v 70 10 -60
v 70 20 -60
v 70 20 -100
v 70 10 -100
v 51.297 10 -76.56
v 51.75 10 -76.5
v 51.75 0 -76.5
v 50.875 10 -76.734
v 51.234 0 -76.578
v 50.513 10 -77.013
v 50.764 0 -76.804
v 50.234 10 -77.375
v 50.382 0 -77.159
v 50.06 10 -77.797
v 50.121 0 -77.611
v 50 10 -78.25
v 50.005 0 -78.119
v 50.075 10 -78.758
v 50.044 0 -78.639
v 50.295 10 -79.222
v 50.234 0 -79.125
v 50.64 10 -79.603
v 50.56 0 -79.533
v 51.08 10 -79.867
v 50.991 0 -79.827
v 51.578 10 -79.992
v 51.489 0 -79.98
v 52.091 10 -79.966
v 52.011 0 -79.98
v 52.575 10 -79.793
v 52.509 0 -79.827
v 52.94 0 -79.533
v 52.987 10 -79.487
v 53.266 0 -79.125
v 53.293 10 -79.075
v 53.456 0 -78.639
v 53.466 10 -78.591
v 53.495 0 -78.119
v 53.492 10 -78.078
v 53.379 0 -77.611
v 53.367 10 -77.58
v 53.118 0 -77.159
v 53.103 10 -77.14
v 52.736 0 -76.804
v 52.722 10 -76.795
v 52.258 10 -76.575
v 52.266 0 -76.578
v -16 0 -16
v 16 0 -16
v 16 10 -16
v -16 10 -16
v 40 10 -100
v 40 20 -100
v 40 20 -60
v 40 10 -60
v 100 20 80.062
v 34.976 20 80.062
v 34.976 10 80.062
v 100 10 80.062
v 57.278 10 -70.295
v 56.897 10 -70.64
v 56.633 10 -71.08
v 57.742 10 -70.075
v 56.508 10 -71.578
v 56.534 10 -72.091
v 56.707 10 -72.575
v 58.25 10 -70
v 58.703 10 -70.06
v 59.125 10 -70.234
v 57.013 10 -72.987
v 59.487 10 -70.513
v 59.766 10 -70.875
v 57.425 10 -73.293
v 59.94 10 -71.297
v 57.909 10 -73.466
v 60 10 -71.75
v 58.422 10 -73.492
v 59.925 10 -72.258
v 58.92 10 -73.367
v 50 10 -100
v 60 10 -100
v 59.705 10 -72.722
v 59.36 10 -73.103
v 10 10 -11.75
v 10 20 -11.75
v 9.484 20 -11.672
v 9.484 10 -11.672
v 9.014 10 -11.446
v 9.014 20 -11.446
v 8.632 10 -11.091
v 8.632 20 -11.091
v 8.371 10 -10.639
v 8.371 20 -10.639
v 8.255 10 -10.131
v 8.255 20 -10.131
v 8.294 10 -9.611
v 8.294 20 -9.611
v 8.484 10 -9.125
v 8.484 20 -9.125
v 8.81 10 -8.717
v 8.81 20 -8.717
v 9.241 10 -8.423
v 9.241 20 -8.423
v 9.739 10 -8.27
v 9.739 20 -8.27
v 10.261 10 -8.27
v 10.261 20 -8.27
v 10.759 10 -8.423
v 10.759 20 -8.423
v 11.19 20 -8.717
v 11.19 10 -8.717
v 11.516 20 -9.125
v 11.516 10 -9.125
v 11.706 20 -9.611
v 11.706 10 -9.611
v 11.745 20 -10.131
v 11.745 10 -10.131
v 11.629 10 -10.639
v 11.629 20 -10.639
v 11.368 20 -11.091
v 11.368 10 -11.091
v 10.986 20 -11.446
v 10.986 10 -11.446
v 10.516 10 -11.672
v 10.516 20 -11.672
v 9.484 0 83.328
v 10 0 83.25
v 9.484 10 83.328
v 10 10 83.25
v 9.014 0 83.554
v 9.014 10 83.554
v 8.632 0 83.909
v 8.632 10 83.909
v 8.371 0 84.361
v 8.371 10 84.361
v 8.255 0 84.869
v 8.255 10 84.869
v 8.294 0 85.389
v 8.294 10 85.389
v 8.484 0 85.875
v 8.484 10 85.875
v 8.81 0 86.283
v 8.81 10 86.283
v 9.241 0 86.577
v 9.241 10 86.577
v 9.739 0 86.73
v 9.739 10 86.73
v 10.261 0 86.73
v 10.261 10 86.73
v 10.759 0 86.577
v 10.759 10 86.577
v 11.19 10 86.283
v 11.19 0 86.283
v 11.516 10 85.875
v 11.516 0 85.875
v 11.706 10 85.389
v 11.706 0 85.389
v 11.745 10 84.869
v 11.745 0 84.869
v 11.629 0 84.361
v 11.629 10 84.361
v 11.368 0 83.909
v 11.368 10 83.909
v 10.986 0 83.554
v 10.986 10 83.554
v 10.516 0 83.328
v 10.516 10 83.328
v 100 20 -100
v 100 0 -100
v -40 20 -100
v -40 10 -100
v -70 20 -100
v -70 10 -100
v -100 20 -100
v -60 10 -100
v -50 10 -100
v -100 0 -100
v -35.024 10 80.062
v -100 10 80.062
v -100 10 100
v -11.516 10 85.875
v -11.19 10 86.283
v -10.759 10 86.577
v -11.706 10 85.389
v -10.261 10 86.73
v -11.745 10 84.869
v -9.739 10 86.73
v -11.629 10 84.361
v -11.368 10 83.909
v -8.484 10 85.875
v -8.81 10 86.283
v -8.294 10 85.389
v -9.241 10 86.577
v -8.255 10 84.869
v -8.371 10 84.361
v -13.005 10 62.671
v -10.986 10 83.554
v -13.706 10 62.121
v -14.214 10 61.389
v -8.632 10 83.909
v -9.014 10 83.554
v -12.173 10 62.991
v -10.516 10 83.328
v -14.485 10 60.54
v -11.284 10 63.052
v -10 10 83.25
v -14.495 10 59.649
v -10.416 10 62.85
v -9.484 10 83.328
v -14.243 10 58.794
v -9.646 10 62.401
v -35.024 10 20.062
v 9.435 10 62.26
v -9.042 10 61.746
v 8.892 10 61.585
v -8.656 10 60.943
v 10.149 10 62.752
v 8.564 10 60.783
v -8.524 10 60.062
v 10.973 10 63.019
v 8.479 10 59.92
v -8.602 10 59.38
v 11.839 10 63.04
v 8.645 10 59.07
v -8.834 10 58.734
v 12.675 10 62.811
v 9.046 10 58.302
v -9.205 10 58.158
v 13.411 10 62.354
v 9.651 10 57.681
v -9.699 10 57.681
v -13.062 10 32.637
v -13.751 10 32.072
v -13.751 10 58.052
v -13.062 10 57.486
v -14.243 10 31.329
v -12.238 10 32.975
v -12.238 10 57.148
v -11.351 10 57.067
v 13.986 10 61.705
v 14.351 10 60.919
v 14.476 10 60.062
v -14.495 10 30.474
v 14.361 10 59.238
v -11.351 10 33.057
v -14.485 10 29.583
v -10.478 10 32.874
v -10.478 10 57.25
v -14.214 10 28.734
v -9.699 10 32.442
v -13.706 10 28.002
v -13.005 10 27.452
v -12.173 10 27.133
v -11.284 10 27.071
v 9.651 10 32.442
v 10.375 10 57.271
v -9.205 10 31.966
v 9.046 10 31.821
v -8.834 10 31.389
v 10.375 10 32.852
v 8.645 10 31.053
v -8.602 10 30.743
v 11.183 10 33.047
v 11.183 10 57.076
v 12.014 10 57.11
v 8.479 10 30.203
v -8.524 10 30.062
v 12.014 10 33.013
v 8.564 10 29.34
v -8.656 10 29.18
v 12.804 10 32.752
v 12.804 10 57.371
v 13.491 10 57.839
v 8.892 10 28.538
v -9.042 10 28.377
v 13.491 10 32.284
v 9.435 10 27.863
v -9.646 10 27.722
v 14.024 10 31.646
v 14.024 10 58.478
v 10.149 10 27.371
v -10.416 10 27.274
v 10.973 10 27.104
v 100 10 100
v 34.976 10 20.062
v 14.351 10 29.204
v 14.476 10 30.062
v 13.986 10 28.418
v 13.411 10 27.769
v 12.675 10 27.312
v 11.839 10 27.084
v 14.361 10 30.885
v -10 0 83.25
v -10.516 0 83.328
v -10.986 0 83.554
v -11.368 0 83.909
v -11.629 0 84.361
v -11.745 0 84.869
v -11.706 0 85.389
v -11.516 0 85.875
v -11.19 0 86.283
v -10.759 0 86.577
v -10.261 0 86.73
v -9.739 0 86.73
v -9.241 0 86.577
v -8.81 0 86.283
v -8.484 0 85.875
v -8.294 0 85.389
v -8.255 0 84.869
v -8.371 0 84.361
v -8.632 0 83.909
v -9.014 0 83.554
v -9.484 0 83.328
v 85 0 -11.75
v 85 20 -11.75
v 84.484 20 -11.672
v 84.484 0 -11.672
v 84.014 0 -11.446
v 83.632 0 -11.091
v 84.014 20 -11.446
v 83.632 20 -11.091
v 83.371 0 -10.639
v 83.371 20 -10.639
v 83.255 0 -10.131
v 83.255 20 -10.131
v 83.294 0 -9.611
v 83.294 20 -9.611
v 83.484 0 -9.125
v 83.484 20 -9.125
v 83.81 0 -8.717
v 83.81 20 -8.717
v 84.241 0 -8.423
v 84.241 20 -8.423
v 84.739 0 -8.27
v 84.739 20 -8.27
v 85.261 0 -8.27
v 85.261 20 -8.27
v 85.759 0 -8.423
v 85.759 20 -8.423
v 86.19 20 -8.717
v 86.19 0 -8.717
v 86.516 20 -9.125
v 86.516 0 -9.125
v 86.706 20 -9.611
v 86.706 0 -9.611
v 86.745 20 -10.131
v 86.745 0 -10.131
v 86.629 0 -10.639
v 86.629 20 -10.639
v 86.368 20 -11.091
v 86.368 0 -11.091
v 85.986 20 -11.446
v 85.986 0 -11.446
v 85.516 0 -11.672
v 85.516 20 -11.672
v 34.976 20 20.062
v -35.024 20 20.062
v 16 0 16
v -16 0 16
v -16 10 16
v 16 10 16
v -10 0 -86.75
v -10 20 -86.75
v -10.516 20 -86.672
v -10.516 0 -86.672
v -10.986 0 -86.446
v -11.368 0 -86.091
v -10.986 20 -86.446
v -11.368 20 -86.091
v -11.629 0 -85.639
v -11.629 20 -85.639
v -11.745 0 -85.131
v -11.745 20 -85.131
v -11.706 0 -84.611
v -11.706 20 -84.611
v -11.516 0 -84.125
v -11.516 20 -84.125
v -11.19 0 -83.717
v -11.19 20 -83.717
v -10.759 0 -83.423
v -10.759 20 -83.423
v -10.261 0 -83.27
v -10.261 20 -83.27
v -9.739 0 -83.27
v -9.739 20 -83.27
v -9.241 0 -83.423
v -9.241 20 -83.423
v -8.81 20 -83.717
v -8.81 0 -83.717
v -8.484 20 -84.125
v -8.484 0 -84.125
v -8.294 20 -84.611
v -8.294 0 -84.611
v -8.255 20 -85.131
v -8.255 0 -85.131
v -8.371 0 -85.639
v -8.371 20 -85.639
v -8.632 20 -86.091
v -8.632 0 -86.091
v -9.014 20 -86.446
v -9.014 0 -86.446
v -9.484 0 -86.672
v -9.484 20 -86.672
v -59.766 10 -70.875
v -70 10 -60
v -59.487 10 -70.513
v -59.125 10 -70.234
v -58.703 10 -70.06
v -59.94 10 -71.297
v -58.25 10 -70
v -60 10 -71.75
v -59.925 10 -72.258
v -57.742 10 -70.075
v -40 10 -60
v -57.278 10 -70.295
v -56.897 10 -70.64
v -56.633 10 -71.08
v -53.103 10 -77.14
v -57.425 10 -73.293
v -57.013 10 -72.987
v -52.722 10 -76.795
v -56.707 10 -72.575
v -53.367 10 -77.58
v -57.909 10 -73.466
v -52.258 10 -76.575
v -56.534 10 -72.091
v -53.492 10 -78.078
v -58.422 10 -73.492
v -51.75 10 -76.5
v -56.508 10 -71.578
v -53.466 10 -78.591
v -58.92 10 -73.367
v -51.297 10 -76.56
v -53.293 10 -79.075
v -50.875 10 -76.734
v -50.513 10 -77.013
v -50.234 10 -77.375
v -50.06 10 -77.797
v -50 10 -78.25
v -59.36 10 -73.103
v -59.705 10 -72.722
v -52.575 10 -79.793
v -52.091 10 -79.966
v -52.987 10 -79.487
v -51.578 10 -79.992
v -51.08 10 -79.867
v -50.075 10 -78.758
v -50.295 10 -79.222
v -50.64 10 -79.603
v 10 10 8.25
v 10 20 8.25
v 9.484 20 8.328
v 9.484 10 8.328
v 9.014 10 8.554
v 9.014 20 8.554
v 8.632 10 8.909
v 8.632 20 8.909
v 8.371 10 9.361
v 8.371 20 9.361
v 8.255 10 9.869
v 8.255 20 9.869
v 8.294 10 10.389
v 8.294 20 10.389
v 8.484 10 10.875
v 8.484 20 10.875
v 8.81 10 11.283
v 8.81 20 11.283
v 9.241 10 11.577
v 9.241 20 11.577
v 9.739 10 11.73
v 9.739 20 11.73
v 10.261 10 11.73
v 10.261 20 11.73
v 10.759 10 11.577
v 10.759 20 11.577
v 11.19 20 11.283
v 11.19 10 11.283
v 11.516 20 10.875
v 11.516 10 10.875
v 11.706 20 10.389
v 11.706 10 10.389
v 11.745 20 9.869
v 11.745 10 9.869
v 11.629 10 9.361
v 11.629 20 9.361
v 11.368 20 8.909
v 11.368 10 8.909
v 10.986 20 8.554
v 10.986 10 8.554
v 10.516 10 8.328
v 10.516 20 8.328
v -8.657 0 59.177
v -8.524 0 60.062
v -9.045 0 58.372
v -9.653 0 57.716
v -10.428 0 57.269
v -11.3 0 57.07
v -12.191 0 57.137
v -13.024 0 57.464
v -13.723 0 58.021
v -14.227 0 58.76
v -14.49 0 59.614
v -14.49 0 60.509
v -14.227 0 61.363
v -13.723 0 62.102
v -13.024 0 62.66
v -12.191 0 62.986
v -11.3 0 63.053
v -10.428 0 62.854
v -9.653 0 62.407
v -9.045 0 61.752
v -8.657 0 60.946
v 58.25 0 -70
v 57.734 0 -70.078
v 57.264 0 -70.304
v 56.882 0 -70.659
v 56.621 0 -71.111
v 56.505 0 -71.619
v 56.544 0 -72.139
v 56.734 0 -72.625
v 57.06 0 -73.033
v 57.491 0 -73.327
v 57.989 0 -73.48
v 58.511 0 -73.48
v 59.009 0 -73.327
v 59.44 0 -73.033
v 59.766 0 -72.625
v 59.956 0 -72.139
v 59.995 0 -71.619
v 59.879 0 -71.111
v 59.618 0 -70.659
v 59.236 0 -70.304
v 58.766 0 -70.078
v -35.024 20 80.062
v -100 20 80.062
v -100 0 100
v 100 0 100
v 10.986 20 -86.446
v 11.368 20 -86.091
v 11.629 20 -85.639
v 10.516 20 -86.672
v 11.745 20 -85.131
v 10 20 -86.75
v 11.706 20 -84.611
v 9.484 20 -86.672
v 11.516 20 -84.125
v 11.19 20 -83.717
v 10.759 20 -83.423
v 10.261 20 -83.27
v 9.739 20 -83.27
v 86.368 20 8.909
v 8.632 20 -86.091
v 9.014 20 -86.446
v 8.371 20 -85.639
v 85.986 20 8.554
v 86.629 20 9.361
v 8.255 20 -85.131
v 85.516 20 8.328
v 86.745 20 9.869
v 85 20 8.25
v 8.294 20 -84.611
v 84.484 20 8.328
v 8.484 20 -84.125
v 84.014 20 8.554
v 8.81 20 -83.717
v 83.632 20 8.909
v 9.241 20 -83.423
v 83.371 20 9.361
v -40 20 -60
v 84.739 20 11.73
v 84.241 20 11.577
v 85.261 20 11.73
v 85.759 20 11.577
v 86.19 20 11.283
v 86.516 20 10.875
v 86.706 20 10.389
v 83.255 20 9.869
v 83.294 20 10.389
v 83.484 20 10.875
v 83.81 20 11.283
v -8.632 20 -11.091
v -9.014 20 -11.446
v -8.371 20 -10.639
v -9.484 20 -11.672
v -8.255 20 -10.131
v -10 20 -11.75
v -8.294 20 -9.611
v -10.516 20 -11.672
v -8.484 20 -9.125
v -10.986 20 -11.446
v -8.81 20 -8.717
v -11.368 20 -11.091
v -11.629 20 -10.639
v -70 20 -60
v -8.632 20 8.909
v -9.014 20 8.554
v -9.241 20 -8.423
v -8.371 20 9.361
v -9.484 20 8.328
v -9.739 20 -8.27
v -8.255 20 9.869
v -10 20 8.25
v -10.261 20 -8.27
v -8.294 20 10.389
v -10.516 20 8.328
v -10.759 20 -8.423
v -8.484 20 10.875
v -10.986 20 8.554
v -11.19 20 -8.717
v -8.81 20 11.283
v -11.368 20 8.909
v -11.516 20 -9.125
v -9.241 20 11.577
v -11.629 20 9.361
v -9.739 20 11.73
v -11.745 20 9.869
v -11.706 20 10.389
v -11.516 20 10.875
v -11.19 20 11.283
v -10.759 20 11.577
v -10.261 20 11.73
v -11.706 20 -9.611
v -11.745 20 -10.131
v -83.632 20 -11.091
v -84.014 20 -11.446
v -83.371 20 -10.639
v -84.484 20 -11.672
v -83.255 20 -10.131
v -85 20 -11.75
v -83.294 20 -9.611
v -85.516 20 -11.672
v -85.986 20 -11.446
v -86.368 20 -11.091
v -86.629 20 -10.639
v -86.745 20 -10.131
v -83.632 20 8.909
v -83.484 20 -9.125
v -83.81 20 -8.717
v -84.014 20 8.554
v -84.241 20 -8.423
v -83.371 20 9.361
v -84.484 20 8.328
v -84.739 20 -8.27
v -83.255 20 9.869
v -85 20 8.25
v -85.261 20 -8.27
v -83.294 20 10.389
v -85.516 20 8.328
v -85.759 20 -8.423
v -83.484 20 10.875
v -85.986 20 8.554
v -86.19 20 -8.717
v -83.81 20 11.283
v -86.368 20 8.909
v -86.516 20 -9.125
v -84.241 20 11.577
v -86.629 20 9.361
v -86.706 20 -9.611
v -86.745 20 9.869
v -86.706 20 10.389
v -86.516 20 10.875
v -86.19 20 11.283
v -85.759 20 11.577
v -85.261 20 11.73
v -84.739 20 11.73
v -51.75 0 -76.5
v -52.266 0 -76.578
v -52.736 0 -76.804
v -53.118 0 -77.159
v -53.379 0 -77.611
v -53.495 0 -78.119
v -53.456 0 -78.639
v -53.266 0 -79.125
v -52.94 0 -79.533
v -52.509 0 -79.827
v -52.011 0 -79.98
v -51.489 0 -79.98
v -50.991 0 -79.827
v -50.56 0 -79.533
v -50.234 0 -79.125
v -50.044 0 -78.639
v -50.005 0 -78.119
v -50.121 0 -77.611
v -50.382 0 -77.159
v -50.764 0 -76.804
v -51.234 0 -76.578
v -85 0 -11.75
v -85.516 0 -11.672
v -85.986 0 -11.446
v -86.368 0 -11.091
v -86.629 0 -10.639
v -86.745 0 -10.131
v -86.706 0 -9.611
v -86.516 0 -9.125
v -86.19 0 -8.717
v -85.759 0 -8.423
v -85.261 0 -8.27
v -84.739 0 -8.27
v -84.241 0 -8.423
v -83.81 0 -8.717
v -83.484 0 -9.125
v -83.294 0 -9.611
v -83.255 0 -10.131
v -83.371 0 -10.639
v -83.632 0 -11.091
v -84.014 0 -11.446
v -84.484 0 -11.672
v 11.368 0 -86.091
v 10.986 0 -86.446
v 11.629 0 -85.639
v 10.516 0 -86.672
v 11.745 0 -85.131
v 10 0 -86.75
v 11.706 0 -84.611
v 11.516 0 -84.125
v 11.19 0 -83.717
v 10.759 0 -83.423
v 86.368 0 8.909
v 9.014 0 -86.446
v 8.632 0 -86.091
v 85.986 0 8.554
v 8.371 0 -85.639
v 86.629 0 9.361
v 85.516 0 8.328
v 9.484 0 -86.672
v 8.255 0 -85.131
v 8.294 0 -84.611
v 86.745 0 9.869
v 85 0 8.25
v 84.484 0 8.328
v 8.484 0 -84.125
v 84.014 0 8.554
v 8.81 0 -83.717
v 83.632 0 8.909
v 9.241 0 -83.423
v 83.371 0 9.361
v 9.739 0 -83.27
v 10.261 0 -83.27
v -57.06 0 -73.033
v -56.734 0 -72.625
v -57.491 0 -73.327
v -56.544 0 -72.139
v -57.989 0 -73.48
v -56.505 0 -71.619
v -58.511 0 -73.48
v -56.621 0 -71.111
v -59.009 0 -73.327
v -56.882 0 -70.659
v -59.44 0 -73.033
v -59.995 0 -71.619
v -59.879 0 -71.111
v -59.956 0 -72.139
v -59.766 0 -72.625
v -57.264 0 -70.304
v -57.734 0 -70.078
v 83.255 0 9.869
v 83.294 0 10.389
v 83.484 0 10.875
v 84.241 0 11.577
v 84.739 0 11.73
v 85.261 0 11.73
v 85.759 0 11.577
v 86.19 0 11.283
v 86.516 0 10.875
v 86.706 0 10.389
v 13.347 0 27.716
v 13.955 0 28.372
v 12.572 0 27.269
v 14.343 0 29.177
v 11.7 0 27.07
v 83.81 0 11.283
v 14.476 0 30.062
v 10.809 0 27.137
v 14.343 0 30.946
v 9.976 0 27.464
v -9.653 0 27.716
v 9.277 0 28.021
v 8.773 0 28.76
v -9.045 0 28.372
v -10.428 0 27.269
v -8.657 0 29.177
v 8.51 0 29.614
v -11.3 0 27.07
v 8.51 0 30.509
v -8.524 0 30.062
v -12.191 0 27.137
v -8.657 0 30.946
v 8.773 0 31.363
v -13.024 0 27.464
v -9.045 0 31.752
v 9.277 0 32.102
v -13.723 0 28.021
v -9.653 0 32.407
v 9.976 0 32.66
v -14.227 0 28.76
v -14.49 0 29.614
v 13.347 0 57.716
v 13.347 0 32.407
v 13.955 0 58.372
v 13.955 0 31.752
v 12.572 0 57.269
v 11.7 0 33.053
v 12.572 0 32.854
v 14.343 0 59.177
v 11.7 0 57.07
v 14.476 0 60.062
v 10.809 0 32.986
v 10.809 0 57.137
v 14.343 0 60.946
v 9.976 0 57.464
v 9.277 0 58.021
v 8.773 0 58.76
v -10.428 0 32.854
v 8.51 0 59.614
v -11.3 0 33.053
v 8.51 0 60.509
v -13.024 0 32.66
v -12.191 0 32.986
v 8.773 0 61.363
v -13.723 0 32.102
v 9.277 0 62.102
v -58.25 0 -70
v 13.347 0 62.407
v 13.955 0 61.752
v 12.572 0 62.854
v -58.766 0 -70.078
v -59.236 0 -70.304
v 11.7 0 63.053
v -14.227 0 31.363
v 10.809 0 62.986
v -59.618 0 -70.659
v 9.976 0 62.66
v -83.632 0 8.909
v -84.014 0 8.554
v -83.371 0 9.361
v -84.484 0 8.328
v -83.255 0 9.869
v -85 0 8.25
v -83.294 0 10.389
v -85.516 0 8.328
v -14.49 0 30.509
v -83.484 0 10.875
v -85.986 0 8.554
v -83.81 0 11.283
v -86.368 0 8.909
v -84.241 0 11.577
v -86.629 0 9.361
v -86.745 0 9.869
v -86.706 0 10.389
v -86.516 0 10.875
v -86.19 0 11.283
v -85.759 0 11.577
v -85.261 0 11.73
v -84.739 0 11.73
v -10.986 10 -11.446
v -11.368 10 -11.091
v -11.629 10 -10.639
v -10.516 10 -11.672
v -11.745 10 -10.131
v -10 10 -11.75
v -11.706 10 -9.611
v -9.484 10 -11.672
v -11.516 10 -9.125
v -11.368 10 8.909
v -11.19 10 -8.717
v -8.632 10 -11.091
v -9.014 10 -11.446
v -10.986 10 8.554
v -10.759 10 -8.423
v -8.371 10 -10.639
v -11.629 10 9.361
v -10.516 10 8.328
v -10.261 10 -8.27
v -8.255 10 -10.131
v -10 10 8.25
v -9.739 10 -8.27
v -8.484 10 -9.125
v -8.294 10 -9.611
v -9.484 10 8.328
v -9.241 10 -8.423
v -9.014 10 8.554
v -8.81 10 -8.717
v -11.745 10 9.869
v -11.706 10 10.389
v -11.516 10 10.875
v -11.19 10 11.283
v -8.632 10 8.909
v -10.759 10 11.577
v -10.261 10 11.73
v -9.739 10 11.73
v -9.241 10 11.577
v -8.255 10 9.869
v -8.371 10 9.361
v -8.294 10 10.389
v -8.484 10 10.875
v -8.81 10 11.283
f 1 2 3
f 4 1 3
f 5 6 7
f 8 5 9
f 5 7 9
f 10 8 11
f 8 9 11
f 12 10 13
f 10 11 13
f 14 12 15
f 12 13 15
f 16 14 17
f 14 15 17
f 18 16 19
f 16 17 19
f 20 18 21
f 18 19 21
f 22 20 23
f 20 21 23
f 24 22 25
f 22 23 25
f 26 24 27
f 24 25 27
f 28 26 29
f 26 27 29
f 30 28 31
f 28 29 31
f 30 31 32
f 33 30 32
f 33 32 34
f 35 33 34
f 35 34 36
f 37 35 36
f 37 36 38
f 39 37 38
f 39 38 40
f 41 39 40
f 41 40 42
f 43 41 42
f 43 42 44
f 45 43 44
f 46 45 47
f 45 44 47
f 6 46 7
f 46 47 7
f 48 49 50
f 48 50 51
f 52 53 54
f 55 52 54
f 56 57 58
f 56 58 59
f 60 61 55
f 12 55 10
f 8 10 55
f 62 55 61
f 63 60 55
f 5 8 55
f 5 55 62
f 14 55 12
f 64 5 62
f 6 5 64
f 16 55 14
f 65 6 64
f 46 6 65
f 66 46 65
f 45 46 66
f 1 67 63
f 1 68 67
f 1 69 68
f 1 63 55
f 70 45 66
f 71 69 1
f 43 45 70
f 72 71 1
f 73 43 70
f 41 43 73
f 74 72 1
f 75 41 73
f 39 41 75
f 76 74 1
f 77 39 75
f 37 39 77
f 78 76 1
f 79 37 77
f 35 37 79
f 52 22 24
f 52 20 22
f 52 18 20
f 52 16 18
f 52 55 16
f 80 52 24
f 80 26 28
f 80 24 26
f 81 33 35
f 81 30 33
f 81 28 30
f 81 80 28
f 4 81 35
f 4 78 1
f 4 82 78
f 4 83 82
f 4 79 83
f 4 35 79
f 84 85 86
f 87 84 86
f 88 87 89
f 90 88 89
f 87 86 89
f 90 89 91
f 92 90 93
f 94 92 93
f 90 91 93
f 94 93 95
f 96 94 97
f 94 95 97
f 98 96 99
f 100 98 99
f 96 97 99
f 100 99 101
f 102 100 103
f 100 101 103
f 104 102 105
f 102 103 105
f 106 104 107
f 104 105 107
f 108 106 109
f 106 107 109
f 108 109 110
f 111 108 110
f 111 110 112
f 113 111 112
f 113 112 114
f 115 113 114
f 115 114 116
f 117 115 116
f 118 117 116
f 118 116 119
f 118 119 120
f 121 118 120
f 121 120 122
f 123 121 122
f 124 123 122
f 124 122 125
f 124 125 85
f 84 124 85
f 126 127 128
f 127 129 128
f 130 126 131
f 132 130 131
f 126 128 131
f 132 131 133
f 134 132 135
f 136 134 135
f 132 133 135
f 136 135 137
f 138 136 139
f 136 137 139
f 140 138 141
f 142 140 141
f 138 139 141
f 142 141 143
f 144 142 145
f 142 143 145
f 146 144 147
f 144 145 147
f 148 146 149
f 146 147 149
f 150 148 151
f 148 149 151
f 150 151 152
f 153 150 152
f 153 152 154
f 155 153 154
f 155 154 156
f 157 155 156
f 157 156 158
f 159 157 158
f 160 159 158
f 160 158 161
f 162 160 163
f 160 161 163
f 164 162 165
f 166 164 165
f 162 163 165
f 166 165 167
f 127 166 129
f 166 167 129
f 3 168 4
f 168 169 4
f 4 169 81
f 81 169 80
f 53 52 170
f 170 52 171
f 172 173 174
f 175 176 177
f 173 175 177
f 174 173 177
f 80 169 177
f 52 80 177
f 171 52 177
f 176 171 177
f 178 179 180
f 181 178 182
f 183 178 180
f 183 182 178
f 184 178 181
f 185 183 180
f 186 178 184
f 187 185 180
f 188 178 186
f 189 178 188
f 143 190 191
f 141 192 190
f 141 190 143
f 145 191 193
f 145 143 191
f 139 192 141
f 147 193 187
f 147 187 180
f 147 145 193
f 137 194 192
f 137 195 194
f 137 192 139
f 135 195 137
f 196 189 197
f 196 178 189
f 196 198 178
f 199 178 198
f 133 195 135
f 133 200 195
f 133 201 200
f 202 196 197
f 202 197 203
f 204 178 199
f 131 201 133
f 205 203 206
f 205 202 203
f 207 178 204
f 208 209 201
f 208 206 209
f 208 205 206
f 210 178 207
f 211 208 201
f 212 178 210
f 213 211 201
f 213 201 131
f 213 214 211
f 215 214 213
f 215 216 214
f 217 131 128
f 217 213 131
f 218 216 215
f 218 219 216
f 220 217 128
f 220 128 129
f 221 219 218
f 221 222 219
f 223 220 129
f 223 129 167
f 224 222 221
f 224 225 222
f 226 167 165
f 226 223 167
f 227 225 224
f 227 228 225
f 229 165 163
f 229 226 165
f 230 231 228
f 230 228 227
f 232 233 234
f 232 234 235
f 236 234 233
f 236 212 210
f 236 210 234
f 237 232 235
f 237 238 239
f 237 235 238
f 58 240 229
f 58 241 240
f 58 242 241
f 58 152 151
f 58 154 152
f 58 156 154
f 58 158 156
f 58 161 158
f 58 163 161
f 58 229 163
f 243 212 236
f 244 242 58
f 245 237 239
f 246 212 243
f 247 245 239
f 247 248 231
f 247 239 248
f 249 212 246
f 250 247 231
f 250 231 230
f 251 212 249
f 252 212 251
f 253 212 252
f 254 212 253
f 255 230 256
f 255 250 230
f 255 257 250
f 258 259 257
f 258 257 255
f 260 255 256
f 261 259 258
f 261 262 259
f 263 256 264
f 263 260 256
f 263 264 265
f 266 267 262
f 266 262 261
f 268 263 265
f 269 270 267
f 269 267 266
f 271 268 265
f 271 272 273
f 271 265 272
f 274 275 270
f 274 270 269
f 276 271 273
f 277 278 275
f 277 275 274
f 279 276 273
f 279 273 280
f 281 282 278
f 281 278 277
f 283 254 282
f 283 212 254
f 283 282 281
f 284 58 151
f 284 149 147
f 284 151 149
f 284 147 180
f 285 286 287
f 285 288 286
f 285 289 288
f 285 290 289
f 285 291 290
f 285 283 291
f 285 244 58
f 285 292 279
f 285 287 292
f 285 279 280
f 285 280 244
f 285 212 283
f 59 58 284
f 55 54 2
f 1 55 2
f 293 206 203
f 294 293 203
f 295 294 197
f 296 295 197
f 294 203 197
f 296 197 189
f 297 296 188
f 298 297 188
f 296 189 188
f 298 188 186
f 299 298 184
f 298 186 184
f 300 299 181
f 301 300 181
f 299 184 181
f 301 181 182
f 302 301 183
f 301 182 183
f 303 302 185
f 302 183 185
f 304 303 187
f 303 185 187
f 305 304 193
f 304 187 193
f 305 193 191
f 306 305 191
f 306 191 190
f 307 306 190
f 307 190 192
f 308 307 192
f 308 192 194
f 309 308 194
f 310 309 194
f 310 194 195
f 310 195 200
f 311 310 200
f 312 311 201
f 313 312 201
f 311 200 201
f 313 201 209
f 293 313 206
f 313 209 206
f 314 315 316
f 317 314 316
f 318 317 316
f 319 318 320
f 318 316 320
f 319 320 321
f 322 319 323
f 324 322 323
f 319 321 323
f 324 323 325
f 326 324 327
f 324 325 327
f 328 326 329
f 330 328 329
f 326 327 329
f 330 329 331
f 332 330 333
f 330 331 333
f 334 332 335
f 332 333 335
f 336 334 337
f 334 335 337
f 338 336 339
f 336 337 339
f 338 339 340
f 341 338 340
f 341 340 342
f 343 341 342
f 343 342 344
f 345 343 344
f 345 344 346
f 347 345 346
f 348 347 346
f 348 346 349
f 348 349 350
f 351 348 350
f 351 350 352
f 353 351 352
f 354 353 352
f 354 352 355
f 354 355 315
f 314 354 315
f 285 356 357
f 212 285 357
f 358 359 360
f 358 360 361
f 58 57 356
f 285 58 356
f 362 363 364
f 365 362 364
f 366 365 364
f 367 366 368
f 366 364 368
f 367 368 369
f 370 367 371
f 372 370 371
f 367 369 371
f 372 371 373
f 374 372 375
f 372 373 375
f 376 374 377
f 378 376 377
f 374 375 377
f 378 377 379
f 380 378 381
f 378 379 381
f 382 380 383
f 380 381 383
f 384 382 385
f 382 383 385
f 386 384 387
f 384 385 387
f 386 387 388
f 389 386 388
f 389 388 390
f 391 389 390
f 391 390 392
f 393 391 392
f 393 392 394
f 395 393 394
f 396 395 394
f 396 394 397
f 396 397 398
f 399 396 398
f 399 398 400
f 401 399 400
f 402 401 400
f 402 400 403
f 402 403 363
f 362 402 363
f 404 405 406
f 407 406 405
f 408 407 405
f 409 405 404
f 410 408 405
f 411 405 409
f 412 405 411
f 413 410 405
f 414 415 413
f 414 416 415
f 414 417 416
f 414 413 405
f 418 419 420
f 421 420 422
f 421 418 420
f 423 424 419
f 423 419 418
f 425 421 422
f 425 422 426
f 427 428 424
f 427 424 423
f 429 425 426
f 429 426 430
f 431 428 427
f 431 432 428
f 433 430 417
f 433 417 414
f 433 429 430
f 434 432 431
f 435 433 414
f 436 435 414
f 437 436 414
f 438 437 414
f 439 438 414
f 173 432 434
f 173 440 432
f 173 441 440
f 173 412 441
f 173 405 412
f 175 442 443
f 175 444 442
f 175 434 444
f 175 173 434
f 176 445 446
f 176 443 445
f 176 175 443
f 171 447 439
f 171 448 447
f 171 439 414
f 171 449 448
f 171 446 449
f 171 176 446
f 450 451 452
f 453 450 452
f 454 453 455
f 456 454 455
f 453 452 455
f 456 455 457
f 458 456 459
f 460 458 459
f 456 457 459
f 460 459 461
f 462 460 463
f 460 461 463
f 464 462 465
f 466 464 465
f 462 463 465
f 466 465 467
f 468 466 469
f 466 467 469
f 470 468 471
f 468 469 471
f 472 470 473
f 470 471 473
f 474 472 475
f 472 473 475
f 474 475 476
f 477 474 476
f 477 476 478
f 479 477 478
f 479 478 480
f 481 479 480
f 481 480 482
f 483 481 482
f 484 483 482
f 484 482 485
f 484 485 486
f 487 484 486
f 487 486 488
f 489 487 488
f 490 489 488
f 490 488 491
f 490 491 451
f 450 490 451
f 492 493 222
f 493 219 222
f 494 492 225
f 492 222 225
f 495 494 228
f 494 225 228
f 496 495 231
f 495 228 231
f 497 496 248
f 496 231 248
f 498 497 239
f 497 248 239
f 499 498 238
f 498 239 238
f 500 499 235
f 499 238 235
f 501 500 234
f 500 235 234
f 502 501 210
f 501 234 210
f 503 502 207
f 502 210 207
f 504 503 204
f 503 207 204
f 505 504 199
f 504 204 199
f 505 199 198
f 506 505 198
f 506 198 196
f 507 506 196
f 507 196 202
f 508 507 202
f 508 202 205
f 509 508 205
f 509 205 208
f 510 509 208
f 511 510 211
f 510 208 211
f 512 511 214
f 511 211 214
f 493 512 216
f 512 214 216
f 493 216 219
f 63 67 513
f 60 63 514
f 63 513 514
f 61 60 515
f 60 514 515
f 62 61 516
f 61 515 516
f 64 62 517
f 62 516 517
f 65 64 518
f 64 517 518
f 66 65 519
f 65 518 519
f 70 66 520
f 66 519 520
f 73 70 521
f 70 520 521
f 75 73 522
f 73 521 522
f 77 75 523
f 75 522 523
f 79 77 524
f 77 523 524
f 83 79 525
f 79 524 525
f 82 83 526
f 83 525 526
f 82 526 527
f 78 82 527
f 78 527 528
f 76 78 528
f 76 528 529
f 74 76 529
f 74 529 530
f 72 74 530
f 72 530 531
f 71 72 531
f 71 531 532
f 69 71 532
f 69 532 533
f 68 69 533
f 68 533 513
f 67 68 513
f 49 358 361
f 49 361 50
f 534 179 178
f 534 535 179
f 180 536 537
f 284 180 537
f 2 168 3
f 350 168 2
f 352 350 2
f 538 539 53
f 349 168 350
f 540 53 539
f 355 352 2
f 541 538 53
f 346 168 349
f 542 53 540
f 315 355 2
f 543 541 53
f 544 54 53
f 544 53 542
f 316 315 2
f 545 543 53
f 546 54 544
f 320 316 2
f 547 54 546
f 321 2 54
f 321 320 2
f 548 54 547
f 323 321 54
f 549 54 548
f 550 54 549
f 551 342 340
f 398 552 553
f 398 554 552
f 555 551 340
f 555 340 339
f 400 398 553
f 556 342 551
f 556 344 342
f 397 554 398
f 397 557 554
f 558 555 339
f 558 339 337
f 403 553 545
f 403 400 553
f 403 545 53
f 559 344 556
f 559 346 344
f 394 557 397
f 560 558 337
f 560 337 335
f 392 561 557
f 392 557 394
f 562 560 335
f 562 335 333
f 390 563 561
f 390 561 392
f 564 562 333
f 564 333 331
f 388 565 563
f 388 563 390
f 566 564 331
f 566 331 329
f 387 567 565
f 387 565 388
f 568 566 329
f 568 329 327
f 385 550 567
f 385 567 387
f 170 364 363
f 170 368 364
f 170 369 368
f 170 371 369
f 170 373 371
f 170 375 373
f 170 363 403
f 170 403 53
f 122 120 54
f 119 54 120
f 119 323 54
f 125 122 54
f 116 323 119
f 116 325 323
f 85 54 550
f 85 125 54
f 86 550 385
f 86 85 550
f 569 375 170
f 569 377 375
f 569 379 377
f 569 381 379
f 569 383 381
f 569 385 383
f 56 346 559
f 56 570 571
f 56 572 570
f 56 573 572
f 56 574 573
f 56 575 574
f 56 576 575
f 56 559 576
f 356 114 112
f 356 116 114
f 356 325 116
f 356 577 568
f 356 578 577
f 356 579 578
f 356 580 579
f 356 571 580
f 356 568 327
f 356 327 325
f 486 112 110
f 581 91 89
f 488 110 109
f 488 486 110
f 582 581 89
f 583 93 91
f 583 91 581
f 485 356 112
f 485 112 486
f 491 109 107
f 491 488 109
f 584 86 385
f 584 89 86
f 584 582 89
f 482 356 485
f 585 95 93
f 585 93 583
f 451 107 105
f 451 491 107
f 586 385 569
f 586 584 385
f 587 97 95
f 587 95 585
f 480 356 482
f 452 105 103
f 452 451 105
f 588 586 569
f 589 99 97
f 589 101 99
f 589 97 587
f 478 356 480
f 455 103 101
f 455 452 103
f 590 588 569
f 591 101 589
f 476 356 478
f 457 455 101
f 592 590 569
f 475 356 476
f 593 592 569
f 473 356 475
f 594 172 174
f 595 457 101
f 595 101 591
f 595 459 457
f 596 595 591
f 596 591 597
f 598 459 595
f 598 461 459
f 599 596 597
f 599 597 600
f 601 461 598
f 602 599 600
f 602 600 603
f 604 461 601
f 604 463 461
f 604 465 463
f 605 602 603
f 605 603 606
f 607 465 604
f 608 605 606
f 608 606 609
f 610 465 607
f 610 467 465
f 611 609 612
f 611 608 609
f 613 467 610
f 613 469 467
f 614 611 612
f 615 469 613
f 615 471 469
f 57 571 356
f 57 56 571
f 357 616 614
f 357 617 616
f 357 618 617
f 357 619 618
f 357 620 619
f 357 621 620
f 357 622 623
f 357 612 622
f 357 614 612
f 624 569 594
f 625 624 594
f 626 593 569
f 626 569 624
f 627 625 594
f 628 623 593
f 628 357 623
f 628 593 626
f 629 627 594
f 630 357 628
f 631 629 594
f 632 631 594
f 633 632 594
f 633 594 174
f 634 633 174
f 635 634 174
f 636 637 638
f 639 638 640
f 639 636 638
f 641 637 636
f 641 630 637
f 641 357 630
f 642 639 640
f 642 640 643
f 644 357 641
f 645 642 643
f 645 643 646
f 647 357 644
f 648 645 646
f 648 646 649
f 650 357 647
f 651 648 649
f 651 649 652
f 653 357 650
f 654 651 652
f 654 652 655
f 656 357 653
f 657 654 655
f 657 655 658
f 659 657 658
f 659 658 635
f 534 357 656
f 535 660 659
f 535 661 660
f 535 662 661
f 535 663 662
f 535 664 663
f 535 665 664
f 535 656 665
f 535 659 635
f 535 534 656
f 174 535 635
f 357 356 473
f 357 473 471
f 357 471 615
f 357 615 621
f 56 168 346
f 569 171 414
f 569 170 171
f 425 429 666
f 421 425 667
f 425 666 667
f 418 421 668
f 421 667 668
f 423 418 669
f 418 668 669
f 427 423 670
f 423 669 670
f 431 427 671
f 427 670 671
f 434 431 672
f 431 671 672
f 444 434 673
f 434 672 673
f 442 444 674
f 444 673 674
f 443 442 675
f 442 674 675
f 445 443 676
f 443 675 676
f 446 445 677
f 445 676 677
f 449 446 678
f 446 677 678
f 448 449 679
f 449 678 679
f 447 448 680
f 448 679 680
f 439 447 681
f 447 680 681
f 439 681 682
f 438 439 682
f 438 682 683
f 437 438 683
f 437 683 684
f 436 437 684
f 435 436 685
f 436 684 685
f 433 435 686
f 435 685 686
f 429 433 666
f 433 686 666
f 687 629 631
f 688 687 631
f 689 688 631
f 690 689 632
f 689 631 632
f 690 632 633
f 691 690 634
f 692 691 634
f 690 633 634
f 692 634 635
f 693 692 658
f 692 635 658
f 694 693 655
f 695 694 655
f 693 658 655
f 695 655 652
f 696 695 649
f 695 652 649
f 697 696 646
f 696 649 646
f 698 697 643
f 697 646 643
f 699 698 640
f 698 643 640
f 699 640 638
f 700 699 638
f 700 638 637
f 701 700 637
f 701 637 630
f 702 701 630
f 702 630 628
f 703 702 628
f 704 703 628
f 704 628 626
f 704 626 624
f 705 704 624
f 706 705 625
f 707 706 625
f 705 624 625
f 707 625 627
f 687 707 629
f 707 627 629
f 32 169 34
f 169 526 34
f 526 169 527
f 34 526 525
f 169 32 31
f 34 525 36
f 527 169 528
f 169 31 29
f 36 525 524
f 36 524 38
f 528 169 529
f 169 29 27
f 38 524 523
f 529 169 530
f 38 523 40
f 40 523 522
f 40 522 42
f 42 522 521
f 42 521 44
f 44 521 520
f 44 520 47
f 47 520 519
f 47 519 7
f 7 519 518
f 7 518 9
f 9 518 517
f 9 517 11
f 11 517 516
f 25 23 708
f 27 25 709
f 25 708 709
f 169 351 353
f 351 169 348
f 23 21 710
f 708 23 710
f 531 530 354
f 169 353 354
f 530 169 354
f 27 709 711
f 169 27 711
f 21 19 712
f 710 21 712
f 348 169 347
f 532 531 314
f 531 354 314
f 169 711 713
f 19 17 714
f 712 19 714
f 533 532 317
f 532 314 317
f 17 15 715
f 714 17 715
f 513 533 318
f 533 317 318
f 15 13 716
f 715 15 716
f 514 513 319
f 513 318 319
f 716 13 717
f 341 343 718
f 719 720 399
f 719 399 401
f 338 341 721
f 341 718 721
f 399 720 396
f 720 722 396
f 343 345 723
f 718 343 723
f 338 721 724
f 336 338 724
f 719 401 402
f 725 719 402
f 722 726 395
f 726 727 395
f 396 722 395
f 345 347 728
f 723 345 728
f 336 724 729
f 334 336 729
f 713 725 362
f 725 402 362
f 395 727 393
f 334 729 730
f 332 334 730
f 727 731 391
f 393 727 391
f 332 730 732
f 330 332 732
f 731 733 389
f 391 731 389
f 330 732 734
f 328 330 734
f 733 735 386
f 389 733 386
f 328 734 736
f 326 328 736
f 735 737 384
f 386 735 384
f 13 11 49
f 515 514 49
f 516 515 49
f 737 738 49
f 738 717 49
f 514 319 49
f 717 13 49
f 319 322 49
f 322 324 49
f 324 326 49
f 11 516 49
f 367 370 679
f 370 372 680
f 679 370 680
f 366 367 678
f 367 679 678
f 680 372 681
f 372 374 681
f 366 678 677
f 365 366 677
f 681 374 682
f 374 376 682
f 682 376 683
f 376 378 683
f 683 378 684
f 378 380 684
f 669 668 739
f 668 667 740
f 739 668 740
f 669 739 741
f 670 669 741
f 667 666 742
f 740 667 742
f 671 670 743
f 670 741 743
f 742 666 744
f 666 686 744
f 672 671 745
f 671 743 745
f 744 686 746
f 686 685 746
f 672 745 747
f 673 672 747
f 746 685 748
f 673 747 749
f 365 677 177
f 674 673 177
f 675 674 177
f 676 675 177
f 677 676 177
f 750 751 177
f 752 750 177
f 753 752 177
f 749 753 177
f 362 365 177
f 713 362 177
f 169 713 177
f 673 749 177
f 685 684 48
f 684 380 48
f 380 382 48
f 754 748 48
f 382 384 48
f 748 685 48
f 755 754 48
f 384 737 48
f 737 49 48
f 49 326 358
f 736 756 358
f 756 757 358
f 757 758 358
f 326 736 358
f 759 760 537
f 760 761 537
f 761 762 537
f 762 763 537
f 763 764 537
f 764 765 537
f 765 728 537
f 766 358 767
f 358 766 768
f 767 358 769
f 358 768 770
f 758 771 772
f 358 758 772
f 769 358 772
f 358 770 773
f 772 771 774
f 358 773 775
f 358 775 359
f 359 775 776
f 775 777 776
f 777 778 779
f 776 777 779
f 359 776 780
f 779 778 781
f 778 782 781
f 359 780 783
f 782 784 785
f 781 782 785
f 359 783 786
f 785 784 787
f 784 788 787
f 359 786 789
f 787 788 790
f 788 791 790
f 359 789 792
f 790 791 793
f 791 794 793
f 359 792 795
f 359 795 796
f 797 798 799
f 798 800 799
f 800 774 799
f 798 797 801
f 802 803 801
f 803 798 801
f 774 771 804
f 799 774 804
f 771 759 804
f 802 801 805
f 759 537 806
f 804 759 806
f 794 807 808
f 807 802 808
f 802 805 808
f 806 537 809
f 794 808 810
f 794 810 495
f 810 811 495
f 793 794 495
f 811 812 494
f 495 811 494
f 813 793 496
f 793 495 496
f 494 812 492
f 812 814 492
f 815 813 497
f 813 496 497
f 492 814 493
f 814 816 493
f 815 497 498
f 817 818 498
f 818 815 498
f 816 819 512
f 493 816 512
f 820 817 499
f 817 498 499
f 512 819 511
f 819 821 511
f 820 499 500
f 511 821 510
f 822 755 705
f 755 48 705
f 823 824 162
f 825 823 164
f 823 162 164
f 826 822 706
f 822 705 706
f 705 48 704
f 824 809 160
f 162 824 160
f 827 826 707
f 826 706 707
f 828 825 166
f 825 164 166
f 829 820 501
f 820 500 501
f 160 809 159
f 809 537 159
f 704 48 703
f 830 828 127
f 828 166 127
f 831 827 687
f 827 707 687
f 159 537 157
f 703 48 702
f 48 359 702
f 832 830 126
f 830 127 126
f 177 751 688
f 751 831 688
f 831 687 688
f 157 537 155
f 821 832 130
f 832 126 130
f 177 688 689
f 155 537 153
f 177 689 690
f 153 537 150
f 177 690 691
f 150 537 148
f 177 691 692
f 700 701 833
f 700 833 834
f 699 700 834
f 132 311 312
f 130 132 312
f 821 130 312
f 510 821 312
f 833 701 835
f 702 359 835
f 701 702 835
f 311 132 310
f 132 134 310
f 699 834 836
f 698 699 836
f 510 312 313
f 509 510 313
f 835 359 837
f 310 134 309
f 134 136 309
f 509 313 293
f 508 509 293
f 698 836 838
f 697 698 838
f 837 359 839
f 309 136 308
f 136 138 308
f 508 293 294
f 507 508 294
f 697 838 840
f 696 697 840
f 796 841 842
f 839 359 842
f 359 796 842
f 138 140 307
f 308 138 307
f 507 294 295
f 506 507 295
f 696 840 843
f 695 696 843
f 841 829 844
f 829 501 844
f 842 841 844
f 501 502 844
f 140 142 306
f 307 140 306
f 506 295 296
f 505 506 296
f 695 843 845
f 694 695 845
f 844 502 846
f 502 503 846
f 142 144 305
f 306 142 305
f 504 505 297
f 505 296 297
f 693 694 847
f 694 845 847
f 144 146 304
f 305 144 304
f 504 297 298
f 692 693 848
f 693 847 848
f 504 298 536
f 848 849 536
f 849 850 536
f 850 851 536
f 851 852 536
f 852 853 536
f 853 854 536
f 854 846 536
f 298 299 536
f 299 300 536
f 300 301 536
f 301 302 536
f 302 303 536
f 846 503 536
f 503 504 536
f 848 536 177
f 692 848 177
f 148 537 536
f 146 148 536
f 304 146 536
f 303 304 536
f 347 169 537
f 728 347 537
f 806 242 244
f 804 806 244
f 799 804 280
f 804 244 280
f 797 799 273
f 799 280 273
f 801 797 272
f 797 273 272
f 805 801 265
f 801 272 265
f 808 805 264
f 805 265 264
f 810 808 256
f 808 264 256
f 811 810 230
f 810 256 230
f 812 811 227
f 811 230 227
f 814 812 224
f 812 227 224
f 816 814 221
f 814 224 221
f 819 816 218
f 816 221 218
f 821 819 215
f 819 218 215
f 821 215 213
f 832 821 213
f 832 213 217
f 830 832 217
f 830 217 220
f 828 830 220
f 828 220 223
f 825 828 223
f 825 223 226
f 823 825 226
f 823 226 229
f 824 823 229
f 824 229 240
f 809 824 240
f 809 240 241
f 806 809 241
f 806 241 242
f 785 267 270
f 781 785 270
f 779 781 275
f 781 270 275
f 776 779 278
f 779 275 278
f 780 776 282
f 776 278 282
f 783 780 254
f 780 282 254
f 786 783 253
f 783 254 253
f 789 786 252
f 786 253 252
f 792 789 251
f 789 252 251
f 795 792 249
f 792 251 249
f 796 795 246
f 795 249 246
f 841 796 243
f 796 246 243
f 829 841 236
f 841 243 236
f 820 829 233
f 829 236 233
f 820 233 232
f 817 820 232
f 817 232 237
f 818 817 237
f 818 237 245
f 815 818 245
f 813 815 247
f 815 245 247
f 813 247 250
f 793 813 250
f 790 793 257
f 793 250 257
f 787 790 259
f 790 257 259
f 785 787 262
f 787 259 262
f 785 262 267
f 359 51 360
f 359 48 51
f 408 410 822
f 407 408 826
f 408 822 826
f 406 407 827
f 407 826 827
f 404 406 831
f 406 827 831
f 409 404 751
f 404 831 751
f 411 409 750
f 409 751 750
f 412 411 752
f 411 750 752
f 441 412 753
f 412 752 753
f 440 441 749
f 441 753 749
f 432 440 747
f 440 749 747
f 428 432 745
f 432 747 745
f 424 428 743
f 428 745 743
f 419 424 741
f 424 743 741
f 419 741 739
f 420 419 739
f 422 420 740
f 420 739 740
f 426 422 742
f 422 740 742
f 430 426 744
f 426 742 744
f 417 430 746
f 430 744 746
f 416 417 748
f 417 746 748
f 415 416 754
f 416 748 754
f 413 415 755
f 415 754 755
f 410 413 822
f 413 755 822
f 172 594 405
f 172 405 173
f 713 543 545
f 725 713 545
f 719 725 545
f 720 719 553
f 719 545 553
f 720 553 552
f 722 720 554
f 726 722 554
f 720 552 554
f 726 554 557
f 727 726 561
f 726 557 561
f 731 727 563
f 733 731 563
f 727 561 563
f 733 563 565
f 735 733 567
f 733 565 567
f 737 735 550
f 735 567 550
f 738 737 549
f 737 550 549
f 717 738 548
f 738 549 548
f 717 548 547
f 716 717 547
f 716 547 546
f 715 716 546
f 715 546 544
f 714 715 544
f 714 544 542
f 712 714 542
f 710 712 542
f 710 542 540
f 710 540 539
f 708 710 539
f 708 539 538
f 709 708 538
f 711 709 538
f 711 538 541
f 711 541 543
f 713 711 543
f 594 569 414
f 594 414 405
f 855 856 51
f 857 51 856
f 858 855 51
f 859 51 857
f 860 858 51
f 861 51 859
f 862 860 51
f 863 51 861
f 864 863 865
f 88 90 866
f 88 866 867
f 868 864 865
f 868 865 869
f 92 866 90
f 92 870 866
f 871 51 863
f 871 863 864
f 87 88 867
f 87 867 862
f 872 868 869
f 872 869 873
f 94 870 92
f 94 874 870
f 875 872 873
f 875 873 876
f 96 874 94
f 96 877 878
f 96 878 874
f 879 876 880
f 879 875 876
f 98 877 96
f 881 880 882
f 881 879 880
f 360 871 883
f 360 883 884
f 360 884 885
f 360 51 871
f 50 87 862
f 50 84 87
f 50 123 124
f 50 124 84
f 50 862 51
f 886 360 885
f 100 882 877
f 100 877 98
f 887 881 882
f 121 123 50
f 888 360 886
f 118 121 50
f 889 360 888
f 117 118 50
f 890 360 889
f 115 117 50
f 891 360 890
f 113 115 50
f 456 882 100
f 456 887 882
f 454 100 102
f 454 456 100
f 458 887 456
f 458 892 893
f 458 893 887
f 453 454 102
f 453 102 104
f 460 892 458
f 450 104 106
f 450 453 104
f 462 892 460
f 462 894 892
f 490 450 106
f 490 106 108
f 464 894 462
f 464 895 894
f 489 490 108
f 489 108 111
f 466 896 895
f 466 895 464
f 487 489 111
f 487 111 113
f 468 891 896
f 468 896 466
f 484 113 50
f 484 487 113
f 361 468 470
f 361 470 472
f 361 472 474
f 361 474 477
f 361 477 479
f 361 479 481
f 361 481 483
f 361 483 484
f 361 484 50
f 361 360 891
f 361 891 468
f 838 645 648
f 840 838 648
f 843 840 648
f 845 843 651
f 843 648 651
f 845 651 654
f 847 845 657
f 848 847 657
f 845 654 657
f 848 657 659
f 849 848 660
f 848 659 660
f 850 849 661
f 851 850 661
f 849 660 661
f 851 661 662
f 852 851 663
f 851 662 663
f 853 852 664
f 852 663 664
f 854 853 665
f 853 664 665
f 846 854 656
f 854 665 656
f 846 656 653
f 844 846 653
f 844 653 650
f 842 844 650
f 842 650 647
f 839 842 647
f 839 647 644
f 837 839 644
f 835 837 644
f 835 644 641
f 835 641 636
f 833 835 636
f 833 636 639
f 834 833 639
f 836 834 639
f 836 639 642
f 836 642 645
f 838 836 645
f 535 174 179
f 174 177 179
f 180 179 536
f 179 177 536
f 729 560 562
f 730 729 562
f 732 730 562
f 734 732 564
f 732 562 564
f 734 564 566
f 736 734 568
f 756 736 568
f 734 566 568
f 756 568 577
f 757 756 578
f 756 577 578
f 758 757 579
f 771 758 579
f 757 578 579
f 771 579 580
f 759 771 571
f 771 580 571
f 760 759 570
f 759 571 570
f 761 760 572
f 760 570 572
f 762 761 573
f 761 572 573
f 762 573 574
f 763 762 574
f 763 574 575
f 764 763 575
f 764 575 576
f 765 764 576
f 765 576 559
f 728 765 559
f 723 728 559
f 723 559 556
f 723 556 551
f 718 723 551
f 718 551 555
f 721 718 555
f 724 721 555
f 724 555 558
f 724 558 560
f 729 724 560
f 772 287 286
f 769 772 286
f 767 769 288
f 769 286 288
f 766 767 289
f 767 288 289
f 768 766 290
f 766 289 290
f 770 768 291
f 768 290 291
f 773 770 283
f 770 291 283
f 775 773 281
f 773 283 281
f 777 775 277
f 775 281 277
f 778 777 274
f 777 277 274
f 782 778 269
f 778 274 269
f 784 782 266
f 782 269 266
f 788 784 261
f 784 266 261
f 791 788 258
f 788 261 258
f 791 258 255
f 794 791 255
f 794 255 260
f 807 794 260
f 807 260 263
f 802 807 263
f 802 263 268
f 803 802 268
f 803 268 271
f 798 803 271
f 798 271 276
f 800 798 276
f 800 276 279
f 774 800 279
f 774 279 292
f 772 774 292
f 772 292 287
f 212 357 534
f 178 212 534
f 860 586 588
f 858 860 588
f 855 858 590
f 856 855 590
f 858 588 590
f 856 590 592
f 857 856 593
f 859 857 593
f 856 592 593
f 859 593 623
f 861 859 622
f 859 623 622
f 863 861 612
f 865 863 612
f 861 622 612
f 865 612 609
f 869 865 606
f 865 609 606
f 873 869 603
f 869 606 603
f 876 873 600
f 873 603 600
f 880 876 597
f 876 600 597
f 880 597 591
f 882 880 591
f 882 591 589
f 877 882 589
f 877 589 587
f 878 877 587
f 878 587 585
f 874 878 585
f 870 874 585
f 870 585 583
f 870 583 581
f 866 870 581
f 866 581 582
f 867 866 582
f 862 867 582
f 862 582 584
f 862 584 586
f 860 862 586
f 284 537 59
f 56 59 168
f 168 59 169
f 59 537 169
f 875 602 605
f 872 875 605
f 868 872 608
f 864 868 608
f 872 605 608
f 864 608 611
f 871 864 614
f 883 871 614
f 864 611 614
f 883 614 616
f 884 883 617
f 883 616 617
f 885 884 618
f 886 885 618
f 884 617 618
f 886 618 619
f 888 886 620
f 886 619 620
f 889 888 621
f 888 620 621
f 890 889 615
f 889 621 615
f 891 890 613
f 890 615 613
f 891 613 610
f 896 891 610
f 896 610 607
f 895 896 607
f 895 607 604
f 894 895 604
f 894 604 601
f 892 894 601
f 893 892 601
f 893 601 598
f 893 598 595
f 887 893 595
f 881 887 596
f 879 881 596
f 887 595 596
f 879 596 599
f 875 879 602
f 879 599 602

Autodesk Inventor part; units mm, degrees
ref_plane "YZ Plane" through (0, 0, 0) normal (1, 0, 0) x (0, 1, 0)
ref_plane "XZ Plane" through (0, 0, 0) normal (0, 1, 0) x (-1, 0, 0)
ref_plane "XY Plane" through (0, 0, 0) normal (0, 0, 1) x (1, 0, 0)
sketch "Boceto1" plane through (0, 0, 0) normal (0, 1, 0) x (-1, 0, 0)
  line L0 (100, 100) -> (-100, 100)
  line L1 (-100, 100) -> (-100, -100)
  line L2 (-100, -100) -> (100, -100)
  line L3 (100, -100) -> (100, 100)
  line L4 (100, 100) -> (-100, -100) construction
  line L5 (-100, 100) -> (100, -100) construction
  point P0 (0, 0)
  dimension "d0" = 200
  dimension "d1" = 200
extrude "Extrusión1" add sketch "Boceto1" along normal blind 20
sketch "Boceto2" plane through (0, 20, 0) normal (0, 1, 0) x (1, 0, 0)
  circle A0 centre (-11.5239, -30.0616) radius 3
  circle A1 centre (11.4761, -30.0616) radius 3
  circle A2 centre (-11.5239, -60.0616) radius 3
  circle A3 centre (11.4761, -60.0616) radius 3
  line L0 (-0.0239, -45.0616) -> (-35.0239, -45.0616)
  line L1 (-35.0239, -45.0616) -> (-35.0239, -80.0616)
  line L2 (-0.0239, -45.0616) -> (34.9761, -45.0616)
  line L3 (-11.5239, -30.0616) -> (11.4761, -60.0616)
  line L4 (-11.5239, -60.0616) -> (11.4761, -30.0616)
  line L5 (34.9761, -20.0616) -> (-35.0239, -20.0616)
  line L6 (-35.0239, -20.0616) -> (-35.0239, -80.0616)
  line L7 (34.9761, -80.0616) -> (34.9761, -20.0616)
  line L8 (-105, -100.0616) -> (105, -100.0616)
  line L9 (-105.0239, -80.0616) -> (104.9761, -80.0616)
  line L10 (-35.0239, -80.0616) -> (34.9761, -80.0616)
  line L11 (105, -100.0616) -> (95.8154, -100.0616)
  line L12 (-105.0239, -80.0616) -> (104.9761, -80.0616)
  line L13 (105, -80.0616) -> (-105, -80.0616)
  line L14 (-105, -100.0616) -> (105, -100.0616)
  line L15 (105, -90.0616) -> (94.0798, -90.0616)
  line L16 (-105, -100.0616) -> (105, -100.0616)
  line L17 (-105, -80.0616) -> (105, -80.0616)
  line L18 (105, -80.0616) -> (105, -100.0616)
  line L19 (105, -100.0616) -> (-105, -100.0616)
  line L20 (-105, -100.0616) -> (-105, -80.0616)
  line L21 (-100, 100) -> (-100, -100) projected
  line L22 (-100, -100) -> (100.4077, -100)
  point P0 (0, 0)
  point P1 (0, -10.0616)
  point P2 (0, -90.0616)
  point P3 (-0.0478, -80.0616)
  dimension "d4" = 20
  dimension "d5" = 20
  dimension "d6" = 30
  dimension "d7" = 30
  dimension "d8" = 20
  dimension "d9" = 35
  dimension "d10" = 35
  dimension "d11" = 60
extrude "Extrusión2" cut sketch "Boceto2" against normal blind 10
sketch "Boceto3" plane through (0, 20, 0) normal (0, 1, 0) x (1, 0, 0)
  circle A0 centre (-11.5239, -30.0616) radius 3 projected
  circle A1 centre (-11.5239, -30.0616) radius 3
  circle A2 centre (11.4761, -30.0616) radius 3 projected
  circle A3 centre (11.4761, -30.0616) radius 3
  circle A4 centre (11.4761, -60.0616) radius 3 projected
  circle A5 centre (11.4761, -60.0616) radius 3
  circle A6 centre (-11.5239, -60.0616) radius 3
  point P0 (0, 0)
extrude "Extrusión3" cut sketch "Boceto3" against normal blind 20
sketch "Boceto4" plane through (0, 20, 0) normal (0, 1, 0) x (1, 0, 0)
  circle A0 centre (-51.75, 78.25) radius 1.75
  line L0 (-50, 70) -> (-60, 70)
  line L1 (-60, 70) -> (-60, 80)
  line L2 (-60, 80) -> (-50, 80)
  line L3 (-50, 80) -> (-50, 70)
  line L4 (-50, 70) -> (-60, 80) construction
  line L5 (-60, 70) -> (-50, 80) construction
  line L6 (-105, 90) -> (-105, -90)
  circle A1 centre (-58.25, 71.75) radius 1.75
  line L7 (0, 90) -> (0, 77.3124)
  circle A2 centre (51.75, 78.25) radius 1.75
  line L8 (50, 70) -> (60, 70)
  line L9 (60, 70) -> (60, 80)
  line L10 (60, 80) -> (50, 80)
  line L11 (50, 80) -> (50, 70)
  line L12 (50, 70) -> (60, 80) construction
  line L13 (60, 70) -> (50, 80) construction
  circle A3 centre (58.25, 71.75) radius 1.75
  line L14 (100, 100) -> (-100, 100) projected
  line L15 (-100, 100) -> (-100, -80.0616) projected
  line L16 (100, -80.0616) -> (100, 100) projected
  point P0 (0, 0)
  point P1 (0, 0)
  point P2 (-60, 75)
  point P3 (60, 75)
  dimension "d16" = 3.5
  dimension "d18" = 1.75
  dimension "d19" = 1.75
  dimension "d20" = 1.75
  dimension "d21" = 1.75
  dimension "d22" = 10
  dimension "d23" = 10
  dimension "d25" = 20
  dimension "d26" = 40
  dimension "d27" = 40
hole "Agujero1" at (-58.25, 20, -71.75) at (-51.75, 20, -78.25) at (58.25, 20, -71.75) at (51.75, 20, -78.25) direction (0, -1, 0) diameter 3.5 end through all
sketch "Boceto5" plane through (0, 20, 0) normal (0, 1, 0) x (1, 0, 0)
  line L0 (0, 90) -> (0, 68.25)
  circle A0 centre (-51.75, 78.25) radius 1.75 projected
  line L1 (-50, 78.25) -> (-50, 100)
  circle A1 centre (-58.25, 71.75) radius 1.75 projected
  line L2 (-60, 71.75) -> (-60, 100)
  line L3 (-60, 100) -> (-70, 100)
  line L4 (-50, 100) -> (-40, 100)
  line L5 (-40, 100) -> (-40, 60)
  line L6 (-40, 60) -> (-70, 60)
  line L7 (-70, 60) -> (-70, 100)
  line L8 (-70, 100) -> (-40, 100)
  circle A2 centre (51.75, 78.25) radius 1.75
  line L9 (50, 78.25) -> (50, 100)
  circle A3 centre (58.25, 71.75) radius 1.75
  line L10 (60, 71.75) -> (60, 100)
  line L11 (60, 100) -> (70, 100)
  line L12 (50, 100) -> (40, 100)
  line L13 (40, 100) -> (40, 60)
  line L14 (40, 60) -> (70, 60)
  line L15 (70, 60) -> (70, 100)
  line L16 (70, 100) -> (40, 100)
  point P0 (0, 0)
  dimension "d38" = 10
  dimension "d39" = 10
  dimension "d40" = 40
extrude "Extrusión4" cut sketch "Boceto5" against normal blind 10
ref_plane "Plano de trabajo1" through (0, 0, -100) normal (-1, 0, 0) x (0, 0, 1)
ref_plane "Plano de trabajo2" through (100, 0, 0) normal (0, 0, -1) x (-1, 0, 0)
sketch "Boceto7" plane through (0, 0, 0) normal (0, -1, 0) x (1, 0, 0)
  circle A0 centre (10, -10) radius 1.75
  line L0 (6.803, 0) -> (14.6069, 0)
  line L1 (0, 0) -> (0, -4.8284)
  line L2 (0, 0) -> (20.0354, 0)
  circle A1 centre (10, 10) radius 1.75
  line L3 (0, 0) -> (0, 4.8284)
  circle A2 centre (-10, -10) radius 1.75
  circle A3 centre (-10, 10) radius 1.75
  dimension "d52" = 3.5
  dimension "d54" = 10
  dimension "d55" = 10
hole "Agujero2" at (10, 0, -10) at (10, 0, 10) at (-10, 0, 10) at (-10, 0, -10) direction (0, 1, 0) diameter 3.5 end through all
sketch "Boceto8" plane through (0, 0, 0) normal (0, -1, 0) x (1, 0, 0)
  line L0 (-16, 16) -> (16, 16)
  line L1 (16, 16) -> (16, -16)
  line L2 (16, -16) -> (-16, -16)
  line L3 (-16, -16) -> (-16, 16)
  line L4 (-16, 16) -> (16, -16) construction
  line L5 (16, 16) -> (-16, -16) construction
  point P0 (0, 0)
  dimension "d63" = 32
  dimension "d64" = 32
extrude "Extrusión5" cut sketch "Boceto8" against normal blind 10
sketch "Boceto9" plane through (0, 0, 0) normal (0, -1, 0) x (1, 0, 0)
  circle A0 centre (85, -10) radius 1.75
  line L0 (100, 100) -> (100, -100) projected
  line L1 (140, 0) -> (-140, 0) projected
  circle A1 centre (85, 10) radius 1.75
  line L2 (0, 0) -> (0, 9.4908)
  circle A2 centre (-85, -10) radius 1.75
  circle A3 centre (-85, 10) radius 1.75
  line L3 (0, 0) -> (6.3157, 6.3157)
  line L4 (0, 0) -> (8.9318, 0) construction
  circle A4 centre (10, 85) radius 1.75
  circle A5 centre (-10, -85) radius 1.75
  line L5 (0, 0) -> (5.9531, -5.9531)
  line L6 (0, 0) -> (8.419, 0) construction
  circle A6 centre (10, -85) radius 1.75
  circle A7 centre (-10, 85) radius 1.75
  dimension "d67" = 3.5
  dimension "d68" = 15
  dimension "d69" = 10
  dimension "d70" = 45
  dimension "d71" = 45
hole "Agujero3" at (-10, 0, 85) at (10, 0, 85) at (85, 0, 10) at (85, 0, -10) at (-85, 0, 10) at (-85, 0, -10) at (-10, 0, -85) at (10, 0, -85) direction (0, 1, 0) diameter 3.5 end through all
properties part number "base_front_red"
